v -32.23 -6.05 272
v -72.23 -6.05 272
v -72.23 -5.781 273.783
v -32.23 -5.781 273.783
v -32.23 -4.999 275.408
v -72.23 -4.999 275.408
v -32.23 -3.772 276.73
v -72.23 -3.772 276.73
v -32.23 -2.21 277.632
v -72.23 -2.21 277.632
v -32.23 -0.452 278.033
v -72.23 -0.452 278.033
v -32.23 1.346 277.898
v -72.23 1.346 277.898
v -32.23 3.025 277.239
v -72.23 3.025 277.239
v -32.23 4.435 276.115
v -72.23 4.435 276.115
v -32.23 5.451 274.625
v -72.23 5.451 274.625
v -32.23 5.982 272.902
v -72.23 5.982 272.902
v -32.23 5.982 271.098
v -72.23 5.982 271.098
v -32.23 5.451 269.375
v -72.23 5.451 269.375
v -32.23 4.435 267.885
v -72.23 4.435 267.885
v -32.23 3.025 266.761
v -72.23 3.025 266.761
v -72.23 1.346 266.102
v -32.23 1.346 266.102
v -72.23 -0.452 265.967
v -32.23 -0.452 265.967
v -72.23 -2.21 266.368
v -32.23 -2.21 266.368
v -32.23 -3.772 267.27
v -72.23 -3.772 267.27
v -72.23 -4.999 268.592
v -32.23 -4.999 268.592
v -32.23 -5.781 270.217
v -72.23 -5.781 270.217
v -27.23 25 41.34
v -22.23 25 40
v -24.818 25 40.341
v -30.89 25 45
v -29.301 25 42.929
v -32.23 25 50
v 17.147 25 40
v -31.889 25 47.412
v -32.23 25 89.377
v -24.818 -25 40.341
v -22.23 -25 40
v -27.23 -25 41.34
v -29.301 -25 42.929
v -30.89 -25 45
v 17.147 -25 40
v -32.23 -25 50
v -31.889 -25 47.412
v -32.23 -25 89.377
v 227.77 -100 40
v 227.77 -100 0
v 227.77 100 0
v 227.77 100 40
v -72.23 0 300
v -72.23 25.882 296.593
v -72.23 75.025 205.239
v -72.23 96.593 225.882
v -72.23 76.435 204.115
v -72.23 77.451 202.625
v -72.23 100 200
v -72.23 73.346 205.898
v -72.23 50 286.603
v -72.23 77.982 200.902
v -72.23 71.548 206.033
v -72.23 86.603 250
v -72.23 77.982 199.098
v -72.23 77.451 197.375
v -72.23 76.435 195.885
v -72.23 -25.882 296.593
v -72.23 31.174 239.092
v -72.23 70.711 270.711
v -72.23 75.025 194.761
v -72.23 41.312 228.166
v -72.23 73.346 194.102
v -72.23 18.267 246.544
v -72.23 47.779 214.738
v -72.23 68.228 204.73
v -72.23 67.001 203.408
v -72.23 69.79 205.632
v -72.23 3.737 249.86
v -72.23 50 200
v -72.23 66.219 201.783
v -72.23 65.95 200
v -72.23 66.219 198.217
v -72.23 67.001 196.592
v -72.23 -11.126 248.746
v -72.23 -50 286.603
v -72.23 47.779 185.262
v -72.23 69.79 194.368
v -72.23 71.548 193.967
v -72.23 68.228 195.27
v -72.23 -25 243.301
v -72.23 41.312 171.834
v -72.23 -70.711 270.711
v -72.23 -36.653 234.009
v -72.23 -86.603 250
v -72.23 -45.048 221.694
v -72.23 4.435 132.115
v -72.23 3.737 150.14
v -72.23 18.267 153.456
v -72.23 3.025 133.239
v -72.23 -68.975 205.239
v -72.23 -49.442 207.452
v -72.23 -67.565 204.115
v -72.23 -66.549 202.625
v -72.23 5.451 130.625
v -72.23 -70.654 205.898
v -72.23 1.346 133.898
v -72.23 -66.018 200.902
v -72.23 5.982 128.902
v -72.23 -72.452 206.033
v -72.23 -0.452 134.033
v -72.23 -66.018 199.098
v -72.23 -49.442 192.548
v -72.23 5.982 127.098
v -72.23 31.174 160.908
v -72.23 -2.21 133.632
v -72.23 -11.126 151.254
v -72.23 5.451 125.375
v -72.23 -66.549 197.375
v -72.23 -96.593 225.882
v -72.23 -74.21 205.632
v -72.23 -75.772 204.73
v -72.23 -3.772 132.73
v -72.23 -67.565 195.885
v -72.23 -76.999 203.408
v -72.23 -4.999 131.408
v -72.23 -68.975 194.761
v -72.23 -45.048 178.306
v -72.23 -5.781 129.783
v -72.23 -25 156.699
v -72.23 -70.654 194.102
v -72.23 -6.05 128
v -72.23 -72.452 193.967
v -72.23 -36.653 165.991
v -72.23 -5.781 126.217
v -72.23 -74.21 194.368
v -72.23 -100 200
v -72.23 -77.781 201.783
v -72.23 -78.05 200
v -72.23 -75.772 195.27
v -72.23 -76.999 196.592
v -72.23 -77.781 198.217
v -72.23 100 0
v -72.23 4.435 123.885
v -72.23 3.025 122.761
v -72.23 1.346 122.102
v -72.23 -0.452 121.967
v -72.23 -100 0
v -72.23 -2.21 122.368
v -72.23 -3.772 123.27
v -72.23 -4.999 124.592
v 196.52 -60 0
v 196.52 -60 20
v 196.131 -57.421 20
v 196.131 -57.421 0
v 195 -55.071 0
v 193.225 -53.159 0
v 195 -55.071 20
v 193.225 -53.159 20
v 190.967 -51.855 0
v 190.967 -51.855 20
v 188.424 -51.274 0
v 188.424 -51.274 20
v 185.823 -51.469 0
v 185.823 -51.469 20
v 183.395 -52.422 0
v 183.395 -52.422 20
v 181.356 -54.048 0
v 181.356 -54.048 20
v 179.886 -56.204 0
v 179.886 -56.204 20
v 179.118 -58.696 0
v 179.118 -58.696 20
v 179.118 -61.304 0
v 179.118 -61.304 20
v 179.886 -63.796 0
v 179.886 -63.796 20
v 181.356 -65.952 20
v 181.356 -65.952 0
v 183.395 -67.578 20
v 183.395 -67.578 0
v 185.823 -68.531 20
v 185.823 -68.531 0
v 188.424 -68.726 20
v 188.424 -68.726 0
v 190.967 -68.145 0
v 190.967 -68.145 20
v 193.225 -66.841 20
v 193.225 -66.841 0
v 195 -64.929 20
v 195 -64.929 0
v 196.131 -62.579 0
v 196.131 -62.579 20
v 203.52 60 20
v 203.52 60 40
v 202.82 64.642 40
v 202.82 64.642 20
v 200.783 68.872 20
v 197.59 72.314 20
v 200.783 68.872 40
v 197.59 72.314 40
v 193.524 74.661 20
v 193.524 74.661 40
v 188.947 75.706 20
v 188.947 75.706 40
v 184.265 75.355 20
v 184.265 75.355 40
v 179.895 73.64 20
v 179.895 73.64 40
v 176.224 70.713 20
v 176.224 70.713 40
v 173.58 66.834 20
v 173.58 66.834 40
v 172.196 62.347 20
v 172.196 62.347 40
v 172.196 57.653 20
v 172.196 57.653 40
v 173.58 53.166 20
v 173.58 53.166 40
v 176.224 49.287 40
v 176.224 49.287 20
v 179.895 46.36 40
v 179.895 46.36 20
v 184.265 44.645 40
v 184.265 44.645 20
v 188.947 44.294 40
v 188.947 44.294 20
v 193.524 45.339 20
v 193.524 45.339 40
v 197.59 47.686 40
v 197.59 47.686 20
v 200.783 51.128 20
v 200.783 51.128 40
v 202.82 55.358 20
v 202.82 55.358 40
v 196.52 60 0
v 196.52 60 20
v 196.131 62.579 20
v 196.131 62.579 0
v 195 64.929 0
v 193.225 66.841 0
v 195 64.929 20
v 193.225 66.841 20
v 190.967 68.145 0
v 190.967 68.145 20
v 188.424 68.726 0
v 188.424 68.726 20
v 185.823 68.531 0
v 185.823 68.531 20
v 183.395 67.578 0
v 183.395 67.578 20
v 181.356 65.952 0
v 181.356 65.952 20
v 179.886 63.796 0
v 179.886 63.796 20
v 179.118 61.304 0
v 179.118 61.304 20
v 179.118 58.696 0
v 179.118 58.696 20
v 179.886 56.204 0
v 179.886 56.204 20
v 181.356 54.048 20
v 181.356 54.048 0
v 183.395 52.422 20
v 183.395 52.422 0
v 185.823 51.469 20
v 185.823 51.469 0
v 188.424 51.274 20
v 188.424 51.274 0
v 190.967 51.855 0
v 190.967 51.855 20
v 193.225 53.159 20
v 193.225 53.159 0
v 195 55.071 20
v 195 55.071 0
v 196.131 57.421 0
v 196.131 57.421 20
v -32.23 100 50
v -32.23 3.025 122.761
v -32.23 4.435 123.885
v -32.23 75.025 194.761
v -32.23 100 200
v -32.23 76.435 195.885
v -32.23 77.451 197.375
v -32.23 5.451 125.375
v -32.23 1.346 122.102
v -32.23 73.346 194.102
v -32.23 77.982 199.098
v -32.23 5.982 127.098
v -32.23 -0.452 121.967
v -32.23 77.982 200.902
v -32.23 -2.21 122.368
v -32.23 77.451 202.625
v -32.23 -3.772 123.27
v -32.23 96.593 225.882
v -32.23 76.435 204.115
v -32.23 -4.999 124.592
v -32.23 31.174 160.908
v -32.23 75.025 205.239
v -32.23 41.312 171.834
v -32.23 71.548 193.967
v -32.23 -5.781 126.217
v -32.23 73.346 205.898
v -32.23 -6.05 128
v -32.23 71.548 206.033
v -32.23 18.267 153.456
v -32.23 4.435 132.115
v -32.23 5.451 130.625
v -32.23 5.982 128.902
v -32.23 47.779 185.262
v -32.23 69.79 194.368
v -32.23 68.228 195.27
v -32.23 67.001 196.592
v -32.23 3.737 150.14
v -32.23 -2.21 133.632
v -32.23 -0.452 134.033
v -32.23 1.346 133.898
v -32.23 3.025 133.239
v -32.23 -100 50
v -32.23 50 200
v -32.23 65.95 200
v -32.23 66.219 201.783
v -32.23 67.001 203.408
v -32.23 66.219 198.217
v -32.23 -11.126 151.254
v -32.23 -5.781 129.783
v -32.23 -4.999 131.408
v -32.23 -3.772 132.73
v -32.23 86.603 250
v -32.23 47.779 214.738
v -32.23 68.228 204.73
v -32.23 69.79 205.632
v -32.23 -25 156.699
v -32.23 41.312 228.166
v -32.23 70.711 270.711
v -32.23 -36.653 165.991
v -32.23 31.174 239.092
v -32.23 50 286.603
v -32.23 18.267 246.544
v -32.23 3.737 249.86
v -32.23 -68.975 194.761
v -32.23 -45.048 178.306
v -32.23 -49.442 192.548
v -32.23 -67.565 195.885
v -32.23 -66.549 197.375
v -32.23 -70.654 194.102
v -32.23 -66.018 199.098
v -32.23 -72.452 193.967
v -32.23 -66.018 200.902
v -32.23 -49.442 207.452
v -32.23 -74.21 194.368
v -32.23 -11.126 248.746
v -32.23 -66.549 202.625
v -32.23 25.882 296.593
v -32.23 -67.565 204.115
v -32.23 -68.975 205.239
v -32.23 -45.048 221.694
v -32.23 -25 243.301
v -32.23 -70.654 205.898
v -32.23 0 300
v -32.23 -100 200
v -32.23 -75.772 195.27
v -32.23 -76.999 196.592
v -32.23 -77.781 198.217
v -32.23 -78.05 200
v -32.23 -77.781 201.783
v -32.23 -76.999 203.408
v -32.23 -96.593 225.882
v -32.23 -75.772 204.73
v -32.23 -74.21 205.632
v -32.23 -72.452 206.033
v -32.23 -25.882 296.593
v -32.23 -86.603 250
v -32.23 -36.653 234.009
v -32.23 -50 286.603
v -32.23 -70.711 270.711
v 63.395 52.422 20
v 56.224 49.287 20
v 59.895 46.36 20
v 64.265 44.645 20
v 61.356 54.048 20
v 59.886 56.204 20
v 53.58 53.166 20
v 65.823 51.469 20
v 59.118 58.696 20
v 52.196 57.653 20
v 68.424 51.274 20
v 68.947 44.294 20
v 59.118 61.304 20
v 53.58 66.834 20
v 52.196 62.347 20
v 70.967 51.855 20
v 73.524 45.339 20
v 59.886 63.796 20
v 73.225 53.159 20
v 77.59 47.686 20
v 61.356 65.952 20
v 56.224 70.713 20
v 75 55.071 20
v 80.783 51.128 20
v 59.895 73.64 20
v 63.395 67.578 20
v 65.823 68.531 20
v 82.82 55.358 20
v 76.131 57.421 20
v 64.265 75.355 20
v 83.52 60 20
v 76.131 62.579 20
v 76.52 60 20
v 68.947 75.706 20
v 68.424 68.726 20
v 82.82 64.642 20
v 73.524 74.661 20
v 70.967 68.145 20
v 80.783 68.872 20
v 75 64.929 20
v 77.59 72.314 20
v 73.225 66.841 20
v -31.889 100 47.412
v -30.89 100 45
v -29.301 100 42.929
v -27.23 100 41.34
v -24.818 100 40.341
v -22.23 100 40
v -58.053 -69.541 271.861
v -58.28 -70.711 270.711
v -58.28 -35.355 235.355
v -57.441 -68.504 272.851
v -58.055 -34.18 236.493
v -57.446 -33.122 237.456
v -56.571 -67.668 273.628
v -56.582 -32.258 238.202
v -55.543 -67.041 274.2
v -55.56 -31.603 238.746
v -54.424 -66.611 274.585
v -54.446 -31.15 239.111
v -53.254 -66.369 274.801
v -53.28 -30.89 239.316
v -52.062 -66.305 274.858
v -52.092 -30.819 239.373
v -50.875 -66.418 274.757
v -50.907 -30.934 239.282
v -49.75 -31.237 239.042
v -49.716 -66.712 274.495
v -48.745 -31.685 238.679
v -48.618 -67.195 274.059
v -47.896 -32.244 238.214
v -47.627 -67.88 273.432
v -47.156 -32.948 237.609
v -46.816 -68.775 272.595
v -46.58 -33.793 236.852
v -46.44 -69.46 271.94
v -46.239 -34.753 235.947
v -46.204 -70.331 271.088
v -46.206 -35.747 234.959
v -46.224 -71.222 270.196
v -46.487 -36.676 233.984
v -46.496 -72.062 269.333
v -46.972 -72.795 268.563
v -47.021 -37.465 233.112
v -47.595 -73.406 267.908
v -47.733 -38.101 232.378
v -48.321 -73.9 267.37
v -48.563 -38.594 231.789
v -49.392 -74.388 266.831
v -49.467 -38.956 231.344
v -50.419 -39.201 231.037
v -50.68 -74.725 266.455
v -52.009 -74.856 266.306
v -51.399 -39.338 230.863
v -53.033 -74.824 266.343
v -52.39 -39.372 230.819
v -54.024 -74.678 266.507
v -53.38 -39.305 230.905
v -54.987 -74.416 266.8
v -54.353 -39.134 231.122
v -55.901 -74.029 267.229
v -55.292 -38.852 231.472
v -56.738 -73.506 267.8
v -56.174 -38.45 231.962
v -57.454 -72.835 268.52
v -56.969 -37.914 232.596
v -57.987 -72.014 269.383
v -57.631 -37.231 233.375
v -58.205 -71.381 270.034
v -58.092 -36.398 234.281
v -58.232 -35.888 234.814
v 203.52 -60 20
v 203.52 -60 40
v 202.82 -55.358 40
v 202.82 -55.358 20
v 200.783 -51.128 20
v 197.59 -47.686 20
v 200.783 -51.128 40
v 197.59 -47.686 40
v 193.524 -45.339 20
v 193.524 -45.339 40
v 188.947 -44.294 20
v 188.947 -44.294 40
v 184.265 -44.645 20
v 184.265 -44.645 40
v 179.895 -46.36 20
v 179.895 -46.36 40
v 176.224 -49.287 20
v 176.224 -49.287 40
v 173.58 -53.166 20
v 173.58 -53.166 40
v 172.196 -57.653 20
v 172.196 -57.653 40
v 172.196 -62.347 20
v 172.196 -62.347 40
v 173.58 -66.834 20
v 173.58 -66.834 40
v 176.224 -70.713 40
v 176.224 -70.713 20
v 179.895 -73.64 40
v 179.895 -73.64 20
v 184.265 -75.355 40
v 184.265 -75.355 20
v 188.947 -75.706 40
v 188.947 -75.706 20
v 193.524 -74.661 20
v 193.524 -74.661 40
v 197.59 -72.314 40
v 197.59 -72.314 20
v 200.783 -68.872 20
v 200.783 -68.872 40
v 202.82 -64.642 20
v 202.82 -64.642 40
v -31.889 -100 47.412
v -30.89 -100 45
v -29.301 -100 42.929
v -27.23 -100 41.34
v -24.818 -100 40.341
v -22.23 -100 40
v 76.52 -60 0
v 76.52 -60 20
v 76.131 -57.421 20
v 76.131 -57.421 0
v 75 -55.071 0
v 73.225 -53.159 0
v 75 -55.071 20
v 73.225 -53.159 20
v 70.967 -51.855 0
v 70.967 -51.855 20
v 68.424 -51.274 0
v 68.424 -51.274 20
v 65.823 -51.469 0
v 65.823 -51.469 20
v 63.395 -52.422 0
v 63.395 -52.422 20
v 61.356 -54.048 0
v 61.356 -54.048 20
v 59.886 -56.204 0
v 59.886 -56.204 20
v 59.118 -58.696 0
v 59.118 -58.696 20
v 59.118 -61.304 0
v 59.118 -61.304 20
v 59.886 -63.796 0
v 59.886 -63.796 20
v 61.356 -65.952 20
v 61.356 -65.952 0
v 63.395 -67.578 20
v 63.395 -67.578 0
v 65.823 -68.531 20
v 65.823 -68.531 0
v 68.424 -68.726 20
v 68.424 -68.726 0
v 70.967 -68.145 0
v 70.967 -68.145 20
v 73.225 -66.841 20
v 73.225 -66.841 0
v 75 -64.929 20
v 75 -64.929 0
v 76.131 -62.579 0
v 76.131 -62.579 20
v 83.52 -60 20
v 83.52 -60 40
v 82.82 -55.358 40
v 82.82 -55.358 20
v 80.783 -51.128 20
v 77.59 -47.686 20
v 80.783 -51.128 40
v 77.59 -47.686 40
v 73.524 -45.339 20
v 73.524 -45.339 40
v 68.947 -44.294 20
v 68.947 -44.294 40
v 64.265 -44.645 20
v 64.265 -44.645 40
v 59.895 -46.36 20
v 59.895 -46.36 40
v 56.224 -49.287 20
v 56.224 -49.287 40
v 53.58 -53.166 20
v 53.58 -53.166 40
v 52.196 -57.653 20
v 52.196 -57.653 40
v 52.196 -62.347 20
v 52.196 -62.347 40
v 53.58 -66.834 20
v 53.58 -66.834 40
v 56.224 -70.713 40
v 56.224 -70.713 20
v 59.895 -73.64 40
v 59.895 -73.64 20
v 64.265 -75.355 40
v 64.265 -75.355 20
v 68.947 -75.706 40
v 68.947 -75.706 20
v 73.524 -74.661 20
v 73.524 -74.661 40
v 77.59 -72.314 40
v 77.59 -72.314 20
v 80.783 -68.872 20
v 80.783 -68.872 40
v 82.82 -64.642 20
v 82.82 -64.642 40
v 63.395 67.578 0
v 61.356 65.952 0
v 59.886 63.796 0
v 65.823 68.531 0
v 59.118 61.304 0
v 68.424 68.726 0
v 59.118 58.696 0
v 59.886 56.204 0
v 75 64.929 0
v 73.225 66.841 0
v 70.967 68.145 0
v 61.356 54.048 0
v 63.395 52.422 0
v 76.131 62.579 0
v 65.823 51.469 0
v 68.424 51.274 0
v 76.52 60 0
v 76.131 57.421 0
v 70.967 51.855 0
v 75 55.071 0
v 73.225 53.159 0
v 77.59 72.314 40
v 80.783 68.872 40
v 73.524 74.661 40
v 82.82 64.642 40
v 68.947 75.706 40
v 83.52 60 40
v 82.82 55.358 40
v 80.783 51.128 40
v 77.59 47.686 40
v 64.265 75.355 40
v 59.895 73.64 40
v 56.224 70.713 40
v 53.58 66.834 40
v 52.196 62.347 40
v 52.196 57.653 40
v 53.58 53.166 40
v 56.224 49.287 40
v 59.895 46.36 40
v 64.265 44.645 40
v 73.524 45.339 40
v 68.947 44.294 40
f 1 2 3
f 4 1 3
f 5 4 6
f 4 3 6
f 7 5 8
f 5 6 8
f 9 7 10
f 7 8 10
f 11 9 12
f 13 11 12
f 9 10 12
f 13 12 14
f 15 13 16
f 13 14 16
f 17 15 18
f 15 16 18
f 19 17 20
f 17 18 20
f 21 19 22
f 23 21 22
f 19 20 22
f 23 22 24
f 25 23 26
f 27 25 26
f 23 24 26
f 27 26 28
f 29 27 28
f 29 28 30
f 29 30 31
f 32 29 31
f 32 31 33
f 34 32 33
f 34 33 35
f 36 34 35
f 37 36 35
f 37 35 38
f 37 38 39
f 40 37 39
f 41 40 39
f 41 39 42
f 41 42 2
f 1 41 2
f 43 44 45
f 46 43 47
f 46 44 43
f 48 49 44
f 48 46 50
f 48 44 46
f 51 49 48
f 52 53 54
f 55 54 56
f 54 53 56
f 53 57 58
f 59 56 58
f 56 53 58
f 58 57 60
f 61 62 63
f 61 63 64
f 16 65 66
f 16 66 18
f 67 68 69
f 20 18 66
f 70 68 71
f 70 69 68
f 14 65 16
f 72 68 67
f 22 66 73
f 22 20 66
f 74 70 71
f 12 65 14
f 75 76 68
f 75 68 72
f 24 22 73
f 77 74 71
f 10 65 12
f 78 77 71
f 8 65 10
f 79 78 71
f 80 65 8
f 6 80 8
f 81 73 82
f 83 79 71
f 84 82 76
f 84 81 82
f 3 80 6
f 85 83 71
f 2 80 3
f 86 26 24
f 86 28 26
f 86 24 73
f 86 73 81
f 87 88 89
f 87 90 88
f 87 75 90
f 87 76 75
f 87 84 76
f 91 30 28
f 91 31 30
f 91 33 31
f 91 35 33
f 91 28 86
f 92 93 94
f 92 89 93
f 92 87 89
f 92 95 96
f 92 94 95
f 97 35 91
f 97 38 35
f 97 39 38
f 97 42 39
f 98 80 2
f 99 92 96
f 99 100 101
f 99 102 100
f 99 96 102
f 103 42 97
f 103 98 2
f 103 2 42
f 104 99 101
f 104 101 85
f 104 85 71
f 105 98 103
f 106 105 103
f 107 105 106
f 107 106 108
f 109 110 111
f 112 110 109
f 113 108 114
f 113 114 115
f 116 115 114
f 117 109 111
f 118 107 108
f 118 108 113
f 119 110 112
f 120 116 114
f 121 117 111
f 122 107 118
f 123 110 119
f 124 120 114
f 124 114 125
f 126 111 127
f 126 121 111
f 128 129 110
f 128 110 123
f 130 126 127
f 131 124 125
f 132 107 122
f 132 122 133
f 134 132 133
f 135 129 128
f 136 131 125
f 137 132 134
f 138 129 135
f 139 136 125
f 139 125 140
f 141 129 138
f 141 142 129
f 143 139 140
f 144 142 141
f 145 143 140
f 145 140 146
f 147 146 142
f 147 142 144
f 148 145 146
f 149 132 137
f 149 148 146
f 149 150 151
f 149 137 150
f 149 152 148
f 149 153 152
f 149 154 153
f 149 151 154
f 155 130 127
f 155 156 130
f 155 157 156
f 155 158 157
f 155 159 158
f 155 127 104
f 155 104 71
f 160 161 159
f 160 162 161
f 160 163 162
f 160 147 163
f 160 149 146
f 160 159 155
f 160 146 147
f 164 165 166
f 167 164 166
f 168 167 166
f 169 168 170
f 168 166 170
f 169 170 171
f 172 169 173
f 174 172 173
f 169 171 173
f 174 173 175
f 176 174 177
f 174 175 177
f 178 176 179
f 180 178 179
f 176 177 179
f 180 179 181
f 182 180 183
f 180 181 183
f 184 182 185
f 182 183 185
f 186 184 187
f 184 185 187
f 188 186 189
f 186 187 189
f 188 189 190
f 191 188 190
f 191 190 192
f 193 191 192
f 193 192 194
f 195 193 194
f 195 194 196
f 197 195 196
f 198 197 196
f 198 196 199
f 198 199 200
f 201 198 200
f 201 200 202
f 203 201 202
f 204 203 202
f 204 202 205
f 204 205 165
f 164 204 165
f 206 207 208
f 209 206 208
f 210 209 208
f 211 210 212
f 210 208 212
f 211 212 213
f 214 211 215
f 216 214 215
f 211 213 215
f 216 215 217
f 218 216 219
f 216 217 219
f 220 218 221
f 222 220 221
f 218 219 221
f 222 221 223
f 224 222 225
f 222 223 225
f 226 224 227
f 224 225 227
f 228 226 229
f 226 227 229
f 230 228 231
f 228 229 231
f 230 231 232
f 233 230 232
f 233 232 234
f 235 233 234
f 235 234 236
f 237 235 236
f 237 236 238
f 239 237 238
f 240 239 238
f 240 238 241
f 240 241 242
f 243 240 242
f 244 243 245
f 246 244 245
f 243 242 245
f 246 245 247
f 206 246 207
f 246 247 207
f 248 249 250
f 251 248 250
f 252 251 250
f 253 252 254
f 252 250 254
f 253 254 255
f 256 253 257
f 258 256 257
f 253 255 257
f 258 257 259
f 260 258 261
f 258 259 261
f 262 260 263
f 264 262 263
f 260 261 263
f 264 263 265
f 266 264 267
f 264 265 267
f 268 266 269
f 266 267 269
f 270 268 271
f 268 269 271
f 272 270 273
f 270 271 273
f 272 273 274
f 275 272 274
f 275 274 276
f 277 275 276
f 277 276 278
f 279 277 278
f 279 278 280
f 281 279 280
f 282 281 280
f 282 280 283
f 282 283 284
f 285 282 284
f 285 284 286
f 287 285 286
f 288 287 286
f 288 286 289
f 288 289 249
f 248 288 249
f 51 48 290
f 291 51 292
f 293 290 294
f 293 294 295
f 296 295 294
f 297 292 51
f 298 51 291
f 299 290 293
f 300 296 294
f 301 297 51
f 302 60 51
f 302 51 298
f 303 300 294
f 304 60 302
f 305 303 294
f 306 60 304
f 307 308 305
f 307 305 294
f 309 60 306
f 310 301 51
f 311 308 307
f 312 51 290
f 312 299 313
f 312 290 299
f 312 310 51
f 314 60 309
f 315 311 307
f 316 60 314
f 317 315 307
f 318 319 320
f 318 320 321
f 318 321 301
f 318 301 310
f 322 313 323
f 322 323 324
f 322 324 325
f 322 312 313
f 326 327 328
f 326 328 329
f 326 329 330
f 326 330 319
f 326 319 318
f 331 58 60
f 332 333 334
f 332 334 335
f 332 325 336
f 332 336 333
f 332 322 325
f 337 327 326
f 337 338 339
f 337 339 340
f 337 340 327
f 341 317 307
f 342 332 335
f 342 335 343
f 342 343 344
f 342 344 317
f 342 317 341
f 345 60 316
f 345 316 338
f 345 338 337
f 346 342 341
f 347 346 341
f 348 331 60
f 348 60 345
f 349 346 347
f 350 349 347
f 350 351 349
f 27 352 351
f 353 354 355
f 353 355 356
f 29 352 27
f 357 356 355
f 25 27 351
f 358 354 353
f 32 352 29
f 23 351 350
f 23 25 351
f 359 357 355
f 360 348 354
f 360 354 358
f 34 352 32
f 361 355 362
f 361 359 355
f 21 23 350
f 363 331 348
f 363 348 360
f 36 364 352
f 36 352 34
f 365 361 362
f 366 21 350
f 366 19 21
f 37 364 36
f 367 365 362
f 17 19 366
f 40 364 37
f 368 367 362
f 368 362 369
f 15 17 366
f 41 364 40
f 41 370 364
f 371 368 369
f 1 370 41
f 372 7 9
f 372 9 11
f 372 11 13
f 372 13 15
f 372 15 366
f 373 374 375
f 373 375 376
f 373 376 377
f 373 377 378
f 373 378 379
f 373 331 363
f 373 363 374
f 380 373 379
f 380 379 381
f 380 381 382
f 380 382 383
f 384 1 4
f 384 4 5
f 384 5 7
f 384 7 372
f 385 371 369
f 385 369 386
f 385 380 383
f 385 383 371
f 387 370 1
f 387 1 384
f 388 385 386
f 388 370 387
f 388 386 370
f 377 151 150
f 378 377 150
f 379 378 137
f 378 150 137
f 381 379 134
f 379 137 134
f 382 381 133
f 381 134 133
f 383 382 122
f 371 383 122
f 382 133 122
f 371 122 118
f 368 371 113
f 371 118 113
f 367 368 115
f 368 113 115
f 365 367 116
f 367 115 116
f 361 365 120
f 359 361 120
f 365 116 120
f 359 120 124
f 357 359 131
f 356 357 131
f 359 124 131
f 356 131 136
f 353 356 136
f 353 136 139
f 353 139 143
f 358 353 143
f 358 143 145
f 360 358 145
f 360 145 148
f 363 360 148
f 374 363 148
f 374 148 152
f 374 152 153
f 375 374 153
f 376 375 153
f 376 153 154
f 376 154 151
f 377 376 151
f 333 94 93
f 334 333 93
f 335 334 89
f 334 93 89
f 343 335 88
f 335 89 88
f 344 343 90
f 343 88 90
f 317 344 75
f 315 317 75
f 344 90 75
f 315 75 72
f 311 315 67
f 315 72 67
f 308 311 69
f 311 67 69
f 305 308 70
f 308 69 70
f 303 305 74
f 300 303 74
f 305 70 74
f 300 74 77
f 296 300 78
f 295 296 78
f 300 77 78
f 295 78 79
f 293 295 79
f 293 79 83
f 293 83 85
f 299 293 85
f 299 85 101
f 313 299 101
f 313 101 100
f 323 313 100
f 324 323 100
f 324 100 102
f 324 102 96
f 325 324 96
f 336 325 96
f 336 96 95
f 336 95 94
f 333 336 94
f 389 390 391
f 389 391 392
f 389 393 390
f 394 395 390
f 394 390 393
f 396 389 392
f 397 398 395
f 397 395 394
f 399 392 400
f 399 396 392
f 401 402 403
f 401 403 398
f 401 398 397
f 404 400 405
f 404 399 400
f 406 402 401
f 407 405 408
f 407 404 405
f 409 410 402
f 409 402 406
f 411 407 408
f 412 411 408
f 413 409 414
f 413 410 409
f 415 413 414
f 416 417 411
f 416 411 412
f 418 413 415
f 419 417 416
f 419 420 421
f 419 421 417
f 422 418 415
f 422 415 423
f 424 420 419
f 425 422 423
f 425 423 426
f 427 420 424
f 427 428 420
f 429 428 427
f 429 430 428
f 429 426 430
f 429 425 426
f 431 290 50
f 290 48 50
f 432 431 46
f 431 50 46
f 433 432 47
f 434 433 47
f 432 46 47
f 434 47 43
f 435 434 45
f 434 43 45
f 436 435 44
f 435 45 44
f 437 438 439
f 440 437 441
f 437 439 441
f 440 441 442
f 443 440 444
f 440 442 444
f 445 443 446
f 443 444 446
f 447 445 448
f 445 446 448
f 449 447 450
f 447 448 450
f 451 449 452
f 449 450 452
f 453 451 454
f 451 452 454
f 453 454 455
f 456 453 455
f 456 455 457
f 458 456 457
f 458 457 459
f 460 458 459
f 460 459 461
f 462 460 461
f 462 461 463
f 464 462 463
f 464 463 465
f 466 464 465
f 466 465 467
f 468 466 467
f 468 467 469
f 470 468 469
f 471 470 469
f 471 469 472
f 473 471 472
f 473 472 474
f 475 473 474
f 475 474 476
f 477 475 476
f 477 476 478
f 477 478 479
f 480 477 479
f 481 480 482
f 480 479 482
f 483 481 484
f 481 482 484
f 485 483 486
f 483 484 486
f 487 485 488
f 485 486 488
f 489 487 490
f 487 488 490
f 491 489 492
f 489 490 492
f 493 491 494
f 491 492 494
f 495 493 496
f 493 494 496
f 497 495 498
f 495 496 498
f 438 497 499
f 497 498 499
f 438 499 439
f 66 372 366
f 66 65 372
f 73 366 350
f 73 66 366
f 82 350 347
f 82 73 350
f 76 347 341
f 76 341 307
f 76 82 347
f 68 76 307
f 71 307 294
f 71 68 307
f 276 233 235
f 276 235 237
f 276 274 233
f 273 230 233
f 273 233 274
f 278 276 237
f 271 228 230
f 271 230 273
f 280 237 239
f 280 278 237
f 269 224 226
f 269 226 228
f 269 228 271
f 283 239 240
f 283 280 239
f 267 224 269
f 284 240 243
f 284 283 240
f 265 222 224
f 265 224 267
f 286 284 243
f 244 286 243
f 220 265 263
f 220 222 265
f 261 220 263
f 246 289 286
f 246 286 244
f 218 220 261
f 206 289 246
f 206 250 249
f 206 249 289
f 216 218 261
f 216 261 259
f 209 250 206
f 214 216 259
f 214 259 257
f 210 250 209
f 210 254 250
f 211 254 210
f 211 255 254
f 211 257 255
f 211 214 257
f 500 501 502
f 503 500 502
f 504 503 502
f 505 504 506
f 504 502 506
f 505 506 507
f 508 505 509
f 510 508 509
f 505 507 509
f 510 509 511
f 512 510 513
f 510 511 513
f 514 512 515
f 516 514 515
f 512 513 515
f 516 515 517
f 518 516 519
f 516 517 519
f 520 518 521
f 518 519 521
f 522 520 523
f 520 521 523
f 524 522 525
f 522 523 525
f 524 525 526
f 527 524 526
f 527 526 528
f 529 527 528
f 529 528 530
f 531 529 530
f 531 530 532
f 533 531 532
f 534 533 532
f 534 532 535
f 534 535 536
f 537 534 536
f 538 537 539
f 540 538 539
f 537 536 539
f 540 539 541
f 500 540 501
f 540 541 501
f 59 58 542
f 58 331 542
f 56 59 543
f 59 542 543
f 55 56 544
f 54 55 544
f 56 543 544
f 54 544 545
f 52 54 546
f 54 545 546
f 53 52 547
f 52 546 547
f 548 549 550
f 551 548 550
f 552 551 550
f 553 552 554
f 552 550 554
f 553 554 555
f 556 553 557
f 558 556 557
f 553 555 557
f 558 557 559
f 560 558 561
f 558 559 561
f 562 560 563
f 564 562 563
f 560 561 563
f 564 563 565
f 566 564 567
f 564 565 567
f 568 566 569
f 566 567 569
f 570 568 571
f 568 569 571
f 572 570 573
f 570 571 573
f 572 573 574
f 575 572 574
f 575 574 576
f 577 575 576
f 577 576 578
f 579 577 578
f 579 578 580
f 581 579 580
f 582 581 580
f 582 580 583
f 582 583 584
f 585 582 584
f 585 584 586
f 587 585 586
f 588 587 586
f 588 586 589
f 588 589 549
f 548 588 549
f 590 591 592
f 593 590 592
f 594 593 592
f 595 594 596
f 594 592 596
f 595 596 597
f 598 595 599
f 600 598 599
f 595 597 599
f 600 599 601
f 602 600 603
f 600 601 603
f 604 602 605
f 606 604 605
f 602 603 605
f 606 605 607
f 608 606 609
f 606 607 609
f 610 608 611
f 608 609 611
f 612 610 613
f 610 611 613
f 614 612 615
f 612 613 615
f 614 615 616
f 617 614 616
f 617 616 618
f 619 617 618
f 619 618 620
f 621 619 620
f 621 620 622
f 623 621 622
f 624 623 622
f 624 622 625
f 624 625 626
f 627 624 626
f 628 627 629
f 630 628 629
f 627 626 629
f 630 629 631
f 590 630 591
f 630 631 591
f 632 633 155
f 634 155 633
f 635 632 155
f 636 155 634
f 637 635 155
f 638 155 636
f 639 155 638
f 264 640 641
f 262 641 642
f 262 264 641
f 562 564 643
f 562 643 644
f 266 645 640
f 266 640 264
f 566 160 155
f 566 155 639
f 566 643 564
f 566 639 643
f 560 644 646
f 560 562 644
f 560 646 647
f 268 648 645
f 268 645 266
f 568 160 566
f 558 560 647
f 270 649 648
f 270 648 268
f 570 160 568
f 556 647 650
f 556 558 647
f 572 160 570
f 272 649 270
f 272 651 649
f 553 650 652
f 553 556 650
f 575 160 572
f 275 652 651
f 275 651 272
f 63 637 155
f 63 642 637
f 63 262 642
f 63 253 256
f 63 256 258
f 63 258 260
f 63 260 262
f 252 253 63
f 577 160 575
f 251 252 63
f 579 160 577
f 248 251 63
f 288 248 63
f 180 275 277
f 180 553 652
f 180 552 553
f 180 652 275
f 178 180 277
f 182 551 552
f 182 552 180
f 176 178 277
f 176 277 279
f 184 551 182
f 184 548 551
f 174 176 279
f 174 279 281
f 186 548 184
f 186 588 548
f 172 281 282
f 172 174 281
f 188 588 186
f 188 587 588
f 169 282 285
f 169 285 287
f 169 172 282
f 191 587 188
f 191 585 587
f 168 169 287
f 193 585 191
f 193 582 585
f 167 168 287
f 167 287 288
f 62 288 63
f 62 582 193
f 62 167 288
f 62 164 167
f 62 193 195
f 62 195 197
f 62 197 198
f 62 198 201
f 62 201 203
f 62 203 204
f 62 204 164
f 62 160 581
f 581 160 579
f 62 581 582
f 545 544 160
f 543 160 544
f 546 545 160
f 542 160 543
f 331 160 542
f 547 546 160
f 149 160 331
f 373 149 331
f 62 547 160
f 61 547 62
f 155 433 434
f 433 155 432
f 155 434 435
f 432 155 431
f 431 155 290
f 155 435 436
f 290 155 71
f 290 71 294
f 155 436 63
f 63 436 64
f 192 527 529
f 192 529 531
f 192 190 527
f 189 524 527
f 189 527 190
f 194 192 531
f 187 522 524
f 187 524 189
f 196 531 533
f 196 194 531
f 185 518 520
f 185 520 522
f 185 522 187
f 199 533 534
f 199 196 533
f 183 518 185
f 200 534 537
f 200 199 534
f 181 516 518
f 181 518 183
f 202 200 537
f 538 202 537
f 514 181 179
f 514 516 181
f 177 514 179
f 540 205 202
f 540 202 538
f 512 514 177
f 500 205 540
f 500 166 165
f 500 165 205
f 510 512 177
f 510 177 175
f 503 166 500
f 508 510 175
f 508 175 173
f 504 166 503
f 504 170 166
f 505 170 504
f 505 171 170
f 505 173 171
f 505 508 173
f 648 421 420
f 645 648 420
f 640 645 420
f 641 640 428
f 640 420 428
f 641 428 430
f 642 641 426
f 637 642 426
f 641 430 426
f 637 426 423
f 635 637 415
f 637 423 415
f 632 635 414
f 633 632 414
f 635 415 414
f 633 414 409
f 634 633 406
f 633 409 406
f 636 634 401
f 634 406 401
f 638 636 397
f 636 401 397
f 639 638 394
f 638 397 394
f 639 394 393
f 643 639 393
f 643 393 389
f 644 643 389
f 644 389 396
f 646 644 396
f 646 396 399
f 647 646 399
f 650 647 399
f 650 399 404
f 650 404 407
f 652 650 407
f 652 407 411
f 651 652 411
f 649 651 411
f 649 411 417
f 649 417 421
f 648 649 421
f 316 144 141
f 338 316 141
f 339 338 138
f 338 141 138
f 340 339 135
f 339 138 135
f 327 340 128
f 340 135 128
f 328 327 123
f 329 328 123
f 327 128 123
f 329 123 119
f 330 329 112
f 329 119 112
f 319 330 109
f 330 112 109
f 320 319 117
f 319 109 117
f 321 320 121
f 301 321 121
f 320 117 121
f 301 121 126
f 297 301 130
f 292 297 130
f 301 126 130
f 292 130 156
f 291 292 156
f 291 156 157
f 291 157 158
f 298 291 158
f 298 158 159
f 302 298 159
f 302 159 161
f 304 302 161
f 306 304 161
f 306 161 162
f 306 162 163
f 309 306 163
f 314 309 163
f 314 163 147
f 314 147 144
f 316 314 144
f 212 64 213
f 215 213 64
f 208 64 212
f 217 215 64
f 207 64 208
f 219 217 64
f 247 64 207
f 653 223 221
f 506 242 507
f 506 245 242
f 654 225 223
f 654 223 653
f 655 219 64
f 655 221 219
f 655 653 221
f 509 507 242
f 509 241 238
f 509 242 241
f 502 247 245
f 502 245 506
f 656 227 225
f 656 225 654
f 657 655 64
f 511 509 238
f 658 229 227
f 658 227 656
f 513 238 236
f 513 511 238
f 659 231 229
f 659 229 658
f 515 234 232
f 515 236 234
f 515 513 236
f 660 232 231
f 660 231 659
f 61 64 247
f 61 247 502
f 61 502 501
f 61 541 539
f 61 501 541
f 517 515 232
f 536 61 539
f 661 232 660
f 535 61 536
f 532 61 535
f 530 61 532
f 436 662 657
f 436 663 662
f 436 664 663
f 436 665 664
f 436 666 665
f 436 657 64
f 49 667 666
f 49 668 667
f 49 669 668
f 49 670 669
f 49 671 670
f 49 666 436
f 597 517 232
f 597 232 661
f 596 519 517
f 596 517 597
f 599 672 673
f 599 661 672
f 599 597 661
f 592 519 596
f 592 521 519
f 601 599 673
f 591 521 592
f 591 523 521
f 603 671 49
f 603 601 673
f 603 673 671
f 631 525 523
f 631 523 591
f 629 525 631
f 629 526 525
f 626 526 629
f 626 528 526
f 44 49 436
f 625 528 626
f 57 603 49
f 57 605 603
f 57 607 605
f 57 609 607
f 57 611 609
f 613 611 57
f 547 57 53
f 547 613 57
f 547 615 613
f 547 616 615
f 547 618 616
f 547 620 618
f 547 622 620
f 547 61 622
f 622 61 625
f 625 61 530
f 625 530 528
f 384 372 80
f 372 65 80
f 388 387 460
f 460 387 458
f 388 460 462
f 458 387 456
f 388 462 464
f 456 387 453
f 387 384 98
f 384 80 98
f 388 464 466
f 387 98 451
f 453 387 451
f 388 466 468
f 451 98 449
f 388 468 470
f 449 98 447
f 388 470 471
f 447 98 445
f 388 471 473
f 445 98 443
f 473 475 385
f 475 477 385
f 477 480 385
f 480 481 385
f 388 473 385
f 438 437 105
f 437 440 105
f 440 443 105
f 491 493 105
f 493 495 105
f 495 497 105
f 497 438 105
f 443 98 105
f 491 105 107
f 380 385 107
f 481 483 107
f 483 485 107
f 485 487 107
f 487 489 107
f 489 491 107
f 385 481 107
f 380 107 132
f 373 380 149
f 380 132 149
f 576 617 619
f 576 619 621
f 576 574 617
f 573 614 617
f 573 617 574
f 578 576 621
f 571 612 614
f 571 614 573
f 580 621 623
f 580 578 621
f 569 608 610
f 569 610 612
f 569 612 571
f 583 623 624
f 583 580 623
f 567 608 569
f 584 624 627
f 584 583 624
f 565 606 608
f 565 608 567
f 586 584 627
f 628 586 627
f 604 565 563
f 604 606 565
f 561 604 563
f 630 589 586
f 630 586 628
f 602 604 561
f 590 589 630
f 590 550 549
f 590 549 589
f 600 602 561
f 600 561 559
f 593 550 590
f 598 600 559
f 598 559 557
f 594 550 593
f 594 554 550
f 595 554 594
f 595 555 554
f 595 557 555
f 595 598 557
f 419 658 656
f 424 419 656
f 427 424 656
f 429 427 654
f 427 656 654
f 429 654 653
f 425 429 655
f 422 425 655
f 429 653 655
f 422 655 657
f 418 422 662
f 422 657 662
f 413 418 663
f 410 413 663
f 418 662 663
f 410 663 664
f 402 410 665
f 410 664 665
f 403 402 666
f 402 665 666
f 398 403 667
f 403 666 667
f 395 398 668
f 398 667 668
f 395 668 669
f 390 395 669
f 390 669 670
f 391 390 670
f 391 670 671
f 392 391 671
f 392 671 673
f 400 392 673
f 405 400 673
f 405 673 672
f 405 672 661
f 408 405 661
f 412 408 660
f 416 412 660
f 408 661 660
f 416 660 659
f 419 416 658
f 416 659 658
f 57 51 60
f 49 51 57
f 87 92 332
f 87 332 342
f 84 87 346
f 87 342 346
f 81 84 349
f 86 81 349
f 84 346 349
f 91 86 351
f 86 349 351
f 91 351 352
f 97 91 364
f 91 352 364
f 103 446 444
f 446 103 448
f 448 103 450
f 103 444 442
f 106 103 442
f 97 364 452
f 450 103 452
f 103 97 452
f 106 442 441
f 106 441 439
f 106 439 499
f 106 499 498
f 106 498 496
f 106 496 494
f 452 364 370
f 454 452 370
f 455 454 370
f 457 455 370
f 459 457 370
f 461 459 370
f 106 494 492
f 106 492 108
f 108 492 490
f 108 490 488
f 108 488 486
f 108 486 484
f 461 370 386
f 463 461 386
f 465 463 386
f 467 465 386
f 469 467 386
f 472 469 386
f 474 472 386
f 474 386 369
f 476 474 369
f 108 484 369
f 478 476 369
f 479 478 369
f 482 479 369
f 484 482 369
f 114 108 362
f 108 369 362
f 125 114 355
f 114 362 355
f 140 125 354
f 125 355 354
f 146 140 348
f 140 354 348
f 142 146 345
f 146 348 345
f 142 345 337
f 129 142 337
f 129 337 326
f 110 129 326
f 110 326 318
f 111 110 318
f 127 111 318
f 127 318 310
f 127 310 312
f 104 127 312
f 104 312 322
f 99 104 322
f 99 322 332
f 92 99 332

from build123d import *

# Parameters (mm, degrees)
F1_DEPTH  = 100
F2_R      = 99.99999
F3_R      = 8.75
F4_DEPTH  = 40.001
F3_R_2    = 15.75
F5_DEPTH  = 20
F6_R      = 50
F7_DEPTH  = 40.001
F11_DEPTH = 25
F12_R     = 10
F13_D     = 12.1
F16_D     = 12.1
F16_DEPTH = 69.85
F16_START = 0.1831763
F16_TIP   = 3.6352067451


# Not quite as in the source:
# - a fillet or chamfer is up to 0.001 mm smaller than in the source, because OpenCascade refuses the exact size


with BuildPart() as f1:
    # F0 (on Front) → F1 (new body, symmetric)
    with BuildSketch(Plane.XZ):
        Polygon((-72.2300410013, 0), (227.7699589987, 0), (227.7699589987, 40), (-32.2300410013, 40), (-32.2300410013, 300), (-72.2300410013, 300), align=None)
    extrude(amount=F1_DEPTH, both=True)

    # F2 (radius 100 in the source; OpenCascade refuses exactly that, so slightly less here)
    f2_edges = [f1.edges().sort_by_distance(p)[0] for p in [
        (-52.230041, -100, 300),
        (-52.230041, 100, 300),
    ]]
    fillet(f2_edges, radius=F2_R)

    # F3 (on face) → F4 (cut, through all)
    with BuildSketch(Plane.XY.offset(40)):
        with Locations((67.7699589987, 60)):
            Circle(F3_R)
        with Locations((187.7699589987, 60)):
            Circle(F3_R)
        with Locations((67.7699589987, -60)):
            Circle(F3_R)
        with Locations((187.7699589987, -60)):
            Circle(F3_R)
    extrude(amount=-F4_DEPTH, mode=Mode.SUBTRACT)

    # F3 (on face) → F5 (cut)
    with BuildSketch(Plane.XY.offset(40)):
        with Locations((187.7699589987, 60)):
            Circle(F3_R_2)
        with Locations((187.7699589987, 60)):
            Circle(F3_R, mode=Mode.SUBTRACT)
        with Locations((67.7699589987, 60)):
            Circle(F3_R_2)
        with Locations((67.7699589987, 60)):
            Circle(F3_R, mode=Mode.SUBTRACT)
        with Locations((67.7699589987, -60)):
            Circle(F3_R_2)
        with Locations((67.7699589987, -60)):
            Circle(F3_R, mode=Mode.SUBTRACT)
        with Locations((187.7699589987, -60)):
            Circle(F3_R_2)
        with Locations((187.7699589987, -60)):
            Circle(F3_R, mode=Mode.SUBTRACT)
    extrude(amount=-F5_DEPTH, mode=Mode.SUBTRACT)

    # F6 (on face) → F7 (cut, through all)
    with BuildSketch(Plane.YZ.offset(-32.2300410013)):
        with Locations((0, 200)):
            Circle(F6_R)
    extrude(amount=-F7_DEPTH, mode=Mode.SUBTRACT)

    # F10 (on offset) → F11 (join, symmetric)
    with BuildSketch(Plane(origin=(0, 0, 0), x_dir=(-1, 0, 0), z_dir=(0, 1, 0))):
        Polygon((-17.1466749161, 40), (32.2300410013, 40), (32.2300410013, 89.3767159174), align=None)
    extrude(amount=F11_DEPTH, both=True)

    # F12
    f12_edges = [f1.edges().sort_by_distance(p)[0] for p in [
        (-32.230041, 62.5, 40),
        (-32.230041, -62.5, 40),
    ]]
    fillet(f12_edges, radius=F12_R)

    # F13 (through all)
    with Locations(Plane.YZ.offset(-32.2300410013)):
        with Locations((0, 272), (72, 200), (0, 128), (-72, 200)):
            Hole(F13_D / 2)

    # F16
    # its depths count from where the whole tool has entered the part; down to there all is cleared
    with Locations(Plane(origin=(0, -170.7106781187, 170.7106781187), x_dir=(1, 0, 0), z_dir=(0, -0.7071067812, 0.7071067812)).offset(-F16_START)):
        with Locations((-52.2300410013, 141.4213562373)):
            Hole(F16_D / 2, depth=F16_DEPTH)
            with Locations((0, 0, -(F16_DEPTH + F16_TIP / 2))):  # 118° drill point
                Cone(0, F16_D / 2, F16_TIP, mode=Mode.SUBTRACT)


solid = f1.part
